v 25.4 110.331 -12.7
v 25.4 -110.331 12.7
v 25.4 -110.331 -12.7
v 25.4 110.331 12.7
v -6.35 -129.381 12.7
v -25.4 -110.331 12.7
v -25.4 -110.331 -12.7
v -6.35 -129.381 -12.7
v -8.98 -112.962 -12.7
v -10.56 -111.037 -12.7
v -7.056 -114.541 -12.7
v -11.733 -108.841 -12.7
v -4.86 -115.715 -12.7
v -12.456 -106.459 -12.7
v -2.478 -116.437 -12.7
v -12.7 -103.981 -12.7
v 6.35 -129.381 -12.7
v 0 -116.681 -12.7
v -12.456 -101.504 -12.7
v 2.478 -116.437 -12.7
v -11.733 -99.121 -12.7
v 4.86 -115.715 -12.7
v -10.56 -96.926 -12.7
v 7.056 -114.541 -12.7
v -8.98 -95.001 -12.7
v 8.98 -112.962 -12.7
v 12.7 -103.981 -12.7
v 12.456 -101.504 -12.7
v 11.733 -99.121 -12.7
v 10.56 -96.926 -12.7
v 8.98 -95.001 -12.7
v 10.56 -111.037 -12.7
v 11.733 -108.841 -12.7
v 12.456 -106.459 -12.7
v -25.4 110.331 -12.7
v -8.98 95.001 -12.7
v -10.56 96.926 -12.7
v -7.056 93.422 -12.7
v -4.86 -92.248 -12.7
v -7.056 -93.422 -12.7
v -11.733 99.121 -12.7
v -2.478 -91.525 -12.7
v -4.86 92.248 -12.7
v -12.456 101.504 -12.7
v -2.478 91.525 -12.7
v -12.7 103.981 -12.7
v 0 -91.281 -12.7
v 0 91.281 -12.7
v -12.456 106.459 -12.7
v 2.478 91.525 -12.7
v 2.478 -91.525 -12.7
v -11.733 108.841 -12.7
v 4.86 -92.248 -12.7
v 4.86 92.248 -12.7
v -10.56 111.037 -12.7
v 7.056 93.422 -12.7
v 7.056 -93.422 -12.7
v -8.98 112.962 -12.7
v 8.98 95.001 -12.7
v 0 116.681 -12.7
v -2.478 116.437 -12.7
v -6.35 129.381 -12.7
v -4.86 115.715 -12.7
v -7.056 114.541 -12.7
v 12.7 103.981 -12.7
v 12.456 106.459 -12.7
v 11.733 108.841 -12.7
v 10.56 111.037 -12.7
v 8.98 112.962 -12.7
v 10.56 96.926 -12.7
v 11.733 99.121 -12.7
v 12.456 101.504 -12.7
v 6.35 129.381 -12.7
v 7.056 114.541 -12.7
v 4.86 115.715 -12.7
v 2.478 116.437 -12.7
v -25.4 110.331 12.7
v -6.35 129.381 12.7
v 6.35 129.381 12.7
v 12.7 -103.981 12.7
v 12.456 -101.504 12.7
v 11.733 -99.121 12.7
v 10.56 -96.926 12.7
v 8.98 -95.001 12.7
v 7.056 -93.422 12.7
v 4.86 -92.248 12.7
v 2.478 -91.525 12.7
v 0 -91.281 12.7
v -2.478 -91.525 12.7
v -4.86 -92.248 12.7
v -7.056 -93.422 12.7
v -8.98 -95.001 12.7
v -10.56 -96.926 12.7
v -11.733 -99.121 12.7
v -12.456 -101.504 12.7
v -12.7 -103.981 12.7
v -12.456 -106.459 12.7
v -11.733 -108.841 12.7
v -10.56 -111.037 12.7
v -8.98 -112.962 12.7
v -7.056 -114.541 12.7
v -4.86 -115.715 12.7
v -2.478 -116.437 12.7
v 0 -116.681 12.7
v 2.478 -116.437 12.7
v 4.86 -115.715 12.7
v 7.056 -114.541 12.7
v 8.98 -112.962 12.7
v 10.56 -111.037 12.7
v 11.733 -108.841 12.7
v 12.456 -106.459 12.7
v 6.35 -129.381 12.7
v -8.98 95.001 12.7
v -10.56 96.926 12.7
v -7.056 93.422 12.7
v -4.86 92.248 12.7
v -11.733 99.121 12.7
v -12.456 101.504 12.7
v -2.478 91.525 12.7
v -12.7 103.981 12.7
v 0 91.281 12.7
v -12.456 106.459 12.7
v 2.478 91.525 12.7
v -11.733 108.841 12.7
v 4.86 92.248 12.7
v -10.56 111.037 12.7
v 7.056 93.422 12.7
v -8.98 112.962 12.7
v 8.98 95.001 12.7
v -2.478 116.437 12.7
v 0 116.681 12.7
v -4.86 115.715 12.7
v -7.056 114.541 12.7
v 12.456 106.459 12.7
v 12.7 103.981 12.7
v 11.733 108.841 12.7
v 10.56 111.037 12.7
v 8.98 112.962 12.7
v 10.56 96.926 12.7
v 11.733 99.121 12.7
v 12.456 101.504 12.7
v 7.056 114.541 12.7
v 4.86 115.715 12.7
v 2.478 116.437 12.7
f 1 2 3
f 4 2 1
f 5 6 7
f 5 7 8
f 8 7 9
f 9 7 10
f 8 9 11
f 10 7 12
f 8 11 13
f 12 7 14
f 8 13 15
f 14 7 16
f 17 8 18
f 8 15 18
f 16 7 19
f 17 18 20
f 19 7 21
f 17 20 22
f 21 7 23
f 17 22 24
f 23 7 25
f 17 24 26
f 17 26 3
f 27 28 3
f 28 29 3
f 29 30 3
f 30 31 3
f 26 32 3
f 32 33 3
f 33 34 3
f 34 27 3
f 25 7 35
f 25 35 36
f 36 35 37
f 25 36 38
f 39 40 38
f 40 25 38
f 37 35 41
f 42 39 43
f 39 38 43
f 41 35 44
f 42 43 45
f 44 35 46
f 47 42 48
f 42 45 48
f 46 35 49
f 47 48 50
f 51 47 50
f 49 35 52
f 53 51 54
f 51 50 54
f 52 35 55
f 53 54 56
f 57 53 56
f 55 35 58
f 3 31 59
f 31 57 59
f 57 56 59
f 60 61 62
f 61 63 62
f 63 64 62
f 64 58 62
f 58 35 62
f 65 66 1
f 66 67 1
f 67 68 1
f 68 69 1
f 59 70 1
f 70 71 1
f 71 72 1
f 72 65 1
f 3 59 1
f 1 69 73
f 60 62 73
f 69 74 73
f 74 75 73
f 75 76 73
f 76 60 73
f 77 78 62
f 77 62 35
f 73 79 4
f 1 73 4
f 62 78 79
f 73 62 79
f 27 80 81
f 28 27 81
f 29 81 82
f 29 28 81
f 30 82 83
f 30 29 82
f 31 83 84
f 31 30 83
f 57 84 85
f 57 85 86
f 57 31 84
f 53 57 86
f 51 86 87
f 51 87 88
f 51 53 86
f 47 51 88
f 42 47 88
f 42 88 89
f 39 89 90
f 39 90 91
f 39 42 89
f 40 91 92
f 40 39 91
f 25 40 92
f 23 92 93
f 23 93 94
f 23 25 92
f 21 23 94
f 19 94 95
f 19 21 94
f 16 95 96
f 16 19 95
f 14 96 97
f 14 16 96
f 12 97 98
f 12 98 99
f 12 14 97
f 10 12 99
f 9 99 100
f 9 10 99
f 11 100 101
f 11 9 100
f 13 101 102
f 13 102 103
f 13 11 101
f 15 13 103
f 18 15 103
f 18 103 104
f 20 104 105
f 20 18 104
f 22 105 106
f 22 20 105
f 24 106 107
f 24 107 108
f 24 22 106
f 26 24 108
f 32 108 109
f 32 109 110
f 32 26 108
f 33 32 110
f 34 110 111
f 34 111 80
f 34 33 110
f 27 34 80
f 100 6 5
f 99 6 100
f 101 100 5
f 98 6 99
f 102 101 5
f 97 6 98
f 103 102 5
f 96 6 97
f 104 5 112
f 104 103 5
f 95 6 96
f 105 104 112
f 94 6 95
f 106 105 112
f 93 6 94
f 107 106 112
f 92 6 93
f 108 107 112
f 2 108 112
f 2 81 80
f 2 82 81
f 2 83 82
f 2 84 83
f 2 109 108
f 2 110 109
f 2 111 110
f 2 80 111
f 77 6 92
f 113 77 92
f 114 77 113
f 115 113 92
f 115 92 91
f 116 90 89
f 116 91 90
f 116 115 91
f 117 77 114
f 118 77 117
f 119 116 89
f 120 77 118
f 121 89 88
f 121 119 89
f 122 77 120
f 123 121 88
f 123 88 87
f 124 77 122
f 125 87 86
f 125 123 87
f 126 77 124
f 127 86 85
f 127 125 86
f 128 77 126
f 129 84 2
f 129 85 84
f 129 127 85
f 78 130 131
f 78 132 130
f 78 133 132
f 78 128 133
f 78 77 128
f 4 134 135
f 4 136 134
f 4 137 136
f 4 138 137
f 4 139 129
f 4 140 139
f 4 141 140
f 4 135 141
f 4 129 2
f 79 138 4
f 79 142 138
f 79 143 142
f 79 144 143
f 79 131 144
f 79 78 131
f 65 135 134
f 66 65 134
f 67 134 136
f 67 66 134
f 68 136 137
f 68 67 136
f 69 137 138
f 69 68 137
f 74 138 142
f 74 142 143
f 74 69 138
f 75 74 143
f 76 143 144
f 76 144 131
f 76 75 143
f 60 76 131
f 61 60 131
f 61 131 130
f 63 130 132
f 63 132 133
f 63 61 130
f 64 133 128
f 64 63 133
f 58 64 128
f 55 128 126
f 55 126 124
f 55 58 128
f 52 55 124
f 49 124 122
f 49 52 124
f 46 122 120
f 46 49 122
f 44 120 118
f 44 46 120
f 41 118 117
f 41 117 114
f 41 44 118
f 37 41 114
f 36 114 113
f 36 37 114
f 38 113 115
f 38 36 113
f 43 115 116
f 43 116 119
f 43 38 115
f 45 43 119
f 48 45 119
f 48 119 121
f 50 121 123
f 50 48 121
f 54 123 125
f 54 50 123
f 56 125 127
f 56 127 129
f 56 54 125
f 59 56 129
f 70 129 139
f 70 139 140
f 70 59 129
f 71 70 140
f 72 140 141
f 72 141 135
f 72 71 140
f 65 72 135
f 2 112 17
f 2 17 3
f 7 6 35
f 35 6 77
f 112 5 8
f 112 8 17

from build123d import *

# Parameters (mm, degrees)
SKETCH1_W          = 50.8
SKETCH1_H          = 258.7625
SKETCH1_R          = 12.7
EXTRUDE1_DEPTH     = 12.7
CUT_EXTRUDE1_DEPTH = 135.275194476


with BuildPart() as part:
    # Sketch1 → Extrude1 (new, symmetric)
    with BuildSketch(Plane.XY):
        Rectangle(SKETCH1_W, SKETCH1_H)
        with Locations((0, 103.98125)):
            Circle(SKETCH1_R, mode=Mode.SUBTRACT)
        with Locations((0, -103.98125)):
            Circle(SKETCH1_R, mode=Mode.SUBTRACT)
    extrude(amount=EXTRUDE1_DEPTH, both=True)

    # Sketch2 → Cut-Extrude1 (cut, through all)
    with BuildSketch(Plane.XY.offset(12.7)):
        Polygon((-6.35, 129.38125), (-25.4, 110.33125), (-25.4, 129.38125), align=None)
        Polygon((6.35, 129.38125), (25.4, 110.33125), (25.4, 129.38125), align=None)
        Polygon((-25.4, -110.33125), (-6.35, -129.38125), (-25.4, -129.38125), align=None)
        Polygon((25.4, -110.33125), (25.4, -129.38125), (6.35, -129.38125), align=None)
    extrude(amount=-CUT_EXTRUDE1_DEPTH, mode=Mode.SUBTRACT)


solid = part.part
